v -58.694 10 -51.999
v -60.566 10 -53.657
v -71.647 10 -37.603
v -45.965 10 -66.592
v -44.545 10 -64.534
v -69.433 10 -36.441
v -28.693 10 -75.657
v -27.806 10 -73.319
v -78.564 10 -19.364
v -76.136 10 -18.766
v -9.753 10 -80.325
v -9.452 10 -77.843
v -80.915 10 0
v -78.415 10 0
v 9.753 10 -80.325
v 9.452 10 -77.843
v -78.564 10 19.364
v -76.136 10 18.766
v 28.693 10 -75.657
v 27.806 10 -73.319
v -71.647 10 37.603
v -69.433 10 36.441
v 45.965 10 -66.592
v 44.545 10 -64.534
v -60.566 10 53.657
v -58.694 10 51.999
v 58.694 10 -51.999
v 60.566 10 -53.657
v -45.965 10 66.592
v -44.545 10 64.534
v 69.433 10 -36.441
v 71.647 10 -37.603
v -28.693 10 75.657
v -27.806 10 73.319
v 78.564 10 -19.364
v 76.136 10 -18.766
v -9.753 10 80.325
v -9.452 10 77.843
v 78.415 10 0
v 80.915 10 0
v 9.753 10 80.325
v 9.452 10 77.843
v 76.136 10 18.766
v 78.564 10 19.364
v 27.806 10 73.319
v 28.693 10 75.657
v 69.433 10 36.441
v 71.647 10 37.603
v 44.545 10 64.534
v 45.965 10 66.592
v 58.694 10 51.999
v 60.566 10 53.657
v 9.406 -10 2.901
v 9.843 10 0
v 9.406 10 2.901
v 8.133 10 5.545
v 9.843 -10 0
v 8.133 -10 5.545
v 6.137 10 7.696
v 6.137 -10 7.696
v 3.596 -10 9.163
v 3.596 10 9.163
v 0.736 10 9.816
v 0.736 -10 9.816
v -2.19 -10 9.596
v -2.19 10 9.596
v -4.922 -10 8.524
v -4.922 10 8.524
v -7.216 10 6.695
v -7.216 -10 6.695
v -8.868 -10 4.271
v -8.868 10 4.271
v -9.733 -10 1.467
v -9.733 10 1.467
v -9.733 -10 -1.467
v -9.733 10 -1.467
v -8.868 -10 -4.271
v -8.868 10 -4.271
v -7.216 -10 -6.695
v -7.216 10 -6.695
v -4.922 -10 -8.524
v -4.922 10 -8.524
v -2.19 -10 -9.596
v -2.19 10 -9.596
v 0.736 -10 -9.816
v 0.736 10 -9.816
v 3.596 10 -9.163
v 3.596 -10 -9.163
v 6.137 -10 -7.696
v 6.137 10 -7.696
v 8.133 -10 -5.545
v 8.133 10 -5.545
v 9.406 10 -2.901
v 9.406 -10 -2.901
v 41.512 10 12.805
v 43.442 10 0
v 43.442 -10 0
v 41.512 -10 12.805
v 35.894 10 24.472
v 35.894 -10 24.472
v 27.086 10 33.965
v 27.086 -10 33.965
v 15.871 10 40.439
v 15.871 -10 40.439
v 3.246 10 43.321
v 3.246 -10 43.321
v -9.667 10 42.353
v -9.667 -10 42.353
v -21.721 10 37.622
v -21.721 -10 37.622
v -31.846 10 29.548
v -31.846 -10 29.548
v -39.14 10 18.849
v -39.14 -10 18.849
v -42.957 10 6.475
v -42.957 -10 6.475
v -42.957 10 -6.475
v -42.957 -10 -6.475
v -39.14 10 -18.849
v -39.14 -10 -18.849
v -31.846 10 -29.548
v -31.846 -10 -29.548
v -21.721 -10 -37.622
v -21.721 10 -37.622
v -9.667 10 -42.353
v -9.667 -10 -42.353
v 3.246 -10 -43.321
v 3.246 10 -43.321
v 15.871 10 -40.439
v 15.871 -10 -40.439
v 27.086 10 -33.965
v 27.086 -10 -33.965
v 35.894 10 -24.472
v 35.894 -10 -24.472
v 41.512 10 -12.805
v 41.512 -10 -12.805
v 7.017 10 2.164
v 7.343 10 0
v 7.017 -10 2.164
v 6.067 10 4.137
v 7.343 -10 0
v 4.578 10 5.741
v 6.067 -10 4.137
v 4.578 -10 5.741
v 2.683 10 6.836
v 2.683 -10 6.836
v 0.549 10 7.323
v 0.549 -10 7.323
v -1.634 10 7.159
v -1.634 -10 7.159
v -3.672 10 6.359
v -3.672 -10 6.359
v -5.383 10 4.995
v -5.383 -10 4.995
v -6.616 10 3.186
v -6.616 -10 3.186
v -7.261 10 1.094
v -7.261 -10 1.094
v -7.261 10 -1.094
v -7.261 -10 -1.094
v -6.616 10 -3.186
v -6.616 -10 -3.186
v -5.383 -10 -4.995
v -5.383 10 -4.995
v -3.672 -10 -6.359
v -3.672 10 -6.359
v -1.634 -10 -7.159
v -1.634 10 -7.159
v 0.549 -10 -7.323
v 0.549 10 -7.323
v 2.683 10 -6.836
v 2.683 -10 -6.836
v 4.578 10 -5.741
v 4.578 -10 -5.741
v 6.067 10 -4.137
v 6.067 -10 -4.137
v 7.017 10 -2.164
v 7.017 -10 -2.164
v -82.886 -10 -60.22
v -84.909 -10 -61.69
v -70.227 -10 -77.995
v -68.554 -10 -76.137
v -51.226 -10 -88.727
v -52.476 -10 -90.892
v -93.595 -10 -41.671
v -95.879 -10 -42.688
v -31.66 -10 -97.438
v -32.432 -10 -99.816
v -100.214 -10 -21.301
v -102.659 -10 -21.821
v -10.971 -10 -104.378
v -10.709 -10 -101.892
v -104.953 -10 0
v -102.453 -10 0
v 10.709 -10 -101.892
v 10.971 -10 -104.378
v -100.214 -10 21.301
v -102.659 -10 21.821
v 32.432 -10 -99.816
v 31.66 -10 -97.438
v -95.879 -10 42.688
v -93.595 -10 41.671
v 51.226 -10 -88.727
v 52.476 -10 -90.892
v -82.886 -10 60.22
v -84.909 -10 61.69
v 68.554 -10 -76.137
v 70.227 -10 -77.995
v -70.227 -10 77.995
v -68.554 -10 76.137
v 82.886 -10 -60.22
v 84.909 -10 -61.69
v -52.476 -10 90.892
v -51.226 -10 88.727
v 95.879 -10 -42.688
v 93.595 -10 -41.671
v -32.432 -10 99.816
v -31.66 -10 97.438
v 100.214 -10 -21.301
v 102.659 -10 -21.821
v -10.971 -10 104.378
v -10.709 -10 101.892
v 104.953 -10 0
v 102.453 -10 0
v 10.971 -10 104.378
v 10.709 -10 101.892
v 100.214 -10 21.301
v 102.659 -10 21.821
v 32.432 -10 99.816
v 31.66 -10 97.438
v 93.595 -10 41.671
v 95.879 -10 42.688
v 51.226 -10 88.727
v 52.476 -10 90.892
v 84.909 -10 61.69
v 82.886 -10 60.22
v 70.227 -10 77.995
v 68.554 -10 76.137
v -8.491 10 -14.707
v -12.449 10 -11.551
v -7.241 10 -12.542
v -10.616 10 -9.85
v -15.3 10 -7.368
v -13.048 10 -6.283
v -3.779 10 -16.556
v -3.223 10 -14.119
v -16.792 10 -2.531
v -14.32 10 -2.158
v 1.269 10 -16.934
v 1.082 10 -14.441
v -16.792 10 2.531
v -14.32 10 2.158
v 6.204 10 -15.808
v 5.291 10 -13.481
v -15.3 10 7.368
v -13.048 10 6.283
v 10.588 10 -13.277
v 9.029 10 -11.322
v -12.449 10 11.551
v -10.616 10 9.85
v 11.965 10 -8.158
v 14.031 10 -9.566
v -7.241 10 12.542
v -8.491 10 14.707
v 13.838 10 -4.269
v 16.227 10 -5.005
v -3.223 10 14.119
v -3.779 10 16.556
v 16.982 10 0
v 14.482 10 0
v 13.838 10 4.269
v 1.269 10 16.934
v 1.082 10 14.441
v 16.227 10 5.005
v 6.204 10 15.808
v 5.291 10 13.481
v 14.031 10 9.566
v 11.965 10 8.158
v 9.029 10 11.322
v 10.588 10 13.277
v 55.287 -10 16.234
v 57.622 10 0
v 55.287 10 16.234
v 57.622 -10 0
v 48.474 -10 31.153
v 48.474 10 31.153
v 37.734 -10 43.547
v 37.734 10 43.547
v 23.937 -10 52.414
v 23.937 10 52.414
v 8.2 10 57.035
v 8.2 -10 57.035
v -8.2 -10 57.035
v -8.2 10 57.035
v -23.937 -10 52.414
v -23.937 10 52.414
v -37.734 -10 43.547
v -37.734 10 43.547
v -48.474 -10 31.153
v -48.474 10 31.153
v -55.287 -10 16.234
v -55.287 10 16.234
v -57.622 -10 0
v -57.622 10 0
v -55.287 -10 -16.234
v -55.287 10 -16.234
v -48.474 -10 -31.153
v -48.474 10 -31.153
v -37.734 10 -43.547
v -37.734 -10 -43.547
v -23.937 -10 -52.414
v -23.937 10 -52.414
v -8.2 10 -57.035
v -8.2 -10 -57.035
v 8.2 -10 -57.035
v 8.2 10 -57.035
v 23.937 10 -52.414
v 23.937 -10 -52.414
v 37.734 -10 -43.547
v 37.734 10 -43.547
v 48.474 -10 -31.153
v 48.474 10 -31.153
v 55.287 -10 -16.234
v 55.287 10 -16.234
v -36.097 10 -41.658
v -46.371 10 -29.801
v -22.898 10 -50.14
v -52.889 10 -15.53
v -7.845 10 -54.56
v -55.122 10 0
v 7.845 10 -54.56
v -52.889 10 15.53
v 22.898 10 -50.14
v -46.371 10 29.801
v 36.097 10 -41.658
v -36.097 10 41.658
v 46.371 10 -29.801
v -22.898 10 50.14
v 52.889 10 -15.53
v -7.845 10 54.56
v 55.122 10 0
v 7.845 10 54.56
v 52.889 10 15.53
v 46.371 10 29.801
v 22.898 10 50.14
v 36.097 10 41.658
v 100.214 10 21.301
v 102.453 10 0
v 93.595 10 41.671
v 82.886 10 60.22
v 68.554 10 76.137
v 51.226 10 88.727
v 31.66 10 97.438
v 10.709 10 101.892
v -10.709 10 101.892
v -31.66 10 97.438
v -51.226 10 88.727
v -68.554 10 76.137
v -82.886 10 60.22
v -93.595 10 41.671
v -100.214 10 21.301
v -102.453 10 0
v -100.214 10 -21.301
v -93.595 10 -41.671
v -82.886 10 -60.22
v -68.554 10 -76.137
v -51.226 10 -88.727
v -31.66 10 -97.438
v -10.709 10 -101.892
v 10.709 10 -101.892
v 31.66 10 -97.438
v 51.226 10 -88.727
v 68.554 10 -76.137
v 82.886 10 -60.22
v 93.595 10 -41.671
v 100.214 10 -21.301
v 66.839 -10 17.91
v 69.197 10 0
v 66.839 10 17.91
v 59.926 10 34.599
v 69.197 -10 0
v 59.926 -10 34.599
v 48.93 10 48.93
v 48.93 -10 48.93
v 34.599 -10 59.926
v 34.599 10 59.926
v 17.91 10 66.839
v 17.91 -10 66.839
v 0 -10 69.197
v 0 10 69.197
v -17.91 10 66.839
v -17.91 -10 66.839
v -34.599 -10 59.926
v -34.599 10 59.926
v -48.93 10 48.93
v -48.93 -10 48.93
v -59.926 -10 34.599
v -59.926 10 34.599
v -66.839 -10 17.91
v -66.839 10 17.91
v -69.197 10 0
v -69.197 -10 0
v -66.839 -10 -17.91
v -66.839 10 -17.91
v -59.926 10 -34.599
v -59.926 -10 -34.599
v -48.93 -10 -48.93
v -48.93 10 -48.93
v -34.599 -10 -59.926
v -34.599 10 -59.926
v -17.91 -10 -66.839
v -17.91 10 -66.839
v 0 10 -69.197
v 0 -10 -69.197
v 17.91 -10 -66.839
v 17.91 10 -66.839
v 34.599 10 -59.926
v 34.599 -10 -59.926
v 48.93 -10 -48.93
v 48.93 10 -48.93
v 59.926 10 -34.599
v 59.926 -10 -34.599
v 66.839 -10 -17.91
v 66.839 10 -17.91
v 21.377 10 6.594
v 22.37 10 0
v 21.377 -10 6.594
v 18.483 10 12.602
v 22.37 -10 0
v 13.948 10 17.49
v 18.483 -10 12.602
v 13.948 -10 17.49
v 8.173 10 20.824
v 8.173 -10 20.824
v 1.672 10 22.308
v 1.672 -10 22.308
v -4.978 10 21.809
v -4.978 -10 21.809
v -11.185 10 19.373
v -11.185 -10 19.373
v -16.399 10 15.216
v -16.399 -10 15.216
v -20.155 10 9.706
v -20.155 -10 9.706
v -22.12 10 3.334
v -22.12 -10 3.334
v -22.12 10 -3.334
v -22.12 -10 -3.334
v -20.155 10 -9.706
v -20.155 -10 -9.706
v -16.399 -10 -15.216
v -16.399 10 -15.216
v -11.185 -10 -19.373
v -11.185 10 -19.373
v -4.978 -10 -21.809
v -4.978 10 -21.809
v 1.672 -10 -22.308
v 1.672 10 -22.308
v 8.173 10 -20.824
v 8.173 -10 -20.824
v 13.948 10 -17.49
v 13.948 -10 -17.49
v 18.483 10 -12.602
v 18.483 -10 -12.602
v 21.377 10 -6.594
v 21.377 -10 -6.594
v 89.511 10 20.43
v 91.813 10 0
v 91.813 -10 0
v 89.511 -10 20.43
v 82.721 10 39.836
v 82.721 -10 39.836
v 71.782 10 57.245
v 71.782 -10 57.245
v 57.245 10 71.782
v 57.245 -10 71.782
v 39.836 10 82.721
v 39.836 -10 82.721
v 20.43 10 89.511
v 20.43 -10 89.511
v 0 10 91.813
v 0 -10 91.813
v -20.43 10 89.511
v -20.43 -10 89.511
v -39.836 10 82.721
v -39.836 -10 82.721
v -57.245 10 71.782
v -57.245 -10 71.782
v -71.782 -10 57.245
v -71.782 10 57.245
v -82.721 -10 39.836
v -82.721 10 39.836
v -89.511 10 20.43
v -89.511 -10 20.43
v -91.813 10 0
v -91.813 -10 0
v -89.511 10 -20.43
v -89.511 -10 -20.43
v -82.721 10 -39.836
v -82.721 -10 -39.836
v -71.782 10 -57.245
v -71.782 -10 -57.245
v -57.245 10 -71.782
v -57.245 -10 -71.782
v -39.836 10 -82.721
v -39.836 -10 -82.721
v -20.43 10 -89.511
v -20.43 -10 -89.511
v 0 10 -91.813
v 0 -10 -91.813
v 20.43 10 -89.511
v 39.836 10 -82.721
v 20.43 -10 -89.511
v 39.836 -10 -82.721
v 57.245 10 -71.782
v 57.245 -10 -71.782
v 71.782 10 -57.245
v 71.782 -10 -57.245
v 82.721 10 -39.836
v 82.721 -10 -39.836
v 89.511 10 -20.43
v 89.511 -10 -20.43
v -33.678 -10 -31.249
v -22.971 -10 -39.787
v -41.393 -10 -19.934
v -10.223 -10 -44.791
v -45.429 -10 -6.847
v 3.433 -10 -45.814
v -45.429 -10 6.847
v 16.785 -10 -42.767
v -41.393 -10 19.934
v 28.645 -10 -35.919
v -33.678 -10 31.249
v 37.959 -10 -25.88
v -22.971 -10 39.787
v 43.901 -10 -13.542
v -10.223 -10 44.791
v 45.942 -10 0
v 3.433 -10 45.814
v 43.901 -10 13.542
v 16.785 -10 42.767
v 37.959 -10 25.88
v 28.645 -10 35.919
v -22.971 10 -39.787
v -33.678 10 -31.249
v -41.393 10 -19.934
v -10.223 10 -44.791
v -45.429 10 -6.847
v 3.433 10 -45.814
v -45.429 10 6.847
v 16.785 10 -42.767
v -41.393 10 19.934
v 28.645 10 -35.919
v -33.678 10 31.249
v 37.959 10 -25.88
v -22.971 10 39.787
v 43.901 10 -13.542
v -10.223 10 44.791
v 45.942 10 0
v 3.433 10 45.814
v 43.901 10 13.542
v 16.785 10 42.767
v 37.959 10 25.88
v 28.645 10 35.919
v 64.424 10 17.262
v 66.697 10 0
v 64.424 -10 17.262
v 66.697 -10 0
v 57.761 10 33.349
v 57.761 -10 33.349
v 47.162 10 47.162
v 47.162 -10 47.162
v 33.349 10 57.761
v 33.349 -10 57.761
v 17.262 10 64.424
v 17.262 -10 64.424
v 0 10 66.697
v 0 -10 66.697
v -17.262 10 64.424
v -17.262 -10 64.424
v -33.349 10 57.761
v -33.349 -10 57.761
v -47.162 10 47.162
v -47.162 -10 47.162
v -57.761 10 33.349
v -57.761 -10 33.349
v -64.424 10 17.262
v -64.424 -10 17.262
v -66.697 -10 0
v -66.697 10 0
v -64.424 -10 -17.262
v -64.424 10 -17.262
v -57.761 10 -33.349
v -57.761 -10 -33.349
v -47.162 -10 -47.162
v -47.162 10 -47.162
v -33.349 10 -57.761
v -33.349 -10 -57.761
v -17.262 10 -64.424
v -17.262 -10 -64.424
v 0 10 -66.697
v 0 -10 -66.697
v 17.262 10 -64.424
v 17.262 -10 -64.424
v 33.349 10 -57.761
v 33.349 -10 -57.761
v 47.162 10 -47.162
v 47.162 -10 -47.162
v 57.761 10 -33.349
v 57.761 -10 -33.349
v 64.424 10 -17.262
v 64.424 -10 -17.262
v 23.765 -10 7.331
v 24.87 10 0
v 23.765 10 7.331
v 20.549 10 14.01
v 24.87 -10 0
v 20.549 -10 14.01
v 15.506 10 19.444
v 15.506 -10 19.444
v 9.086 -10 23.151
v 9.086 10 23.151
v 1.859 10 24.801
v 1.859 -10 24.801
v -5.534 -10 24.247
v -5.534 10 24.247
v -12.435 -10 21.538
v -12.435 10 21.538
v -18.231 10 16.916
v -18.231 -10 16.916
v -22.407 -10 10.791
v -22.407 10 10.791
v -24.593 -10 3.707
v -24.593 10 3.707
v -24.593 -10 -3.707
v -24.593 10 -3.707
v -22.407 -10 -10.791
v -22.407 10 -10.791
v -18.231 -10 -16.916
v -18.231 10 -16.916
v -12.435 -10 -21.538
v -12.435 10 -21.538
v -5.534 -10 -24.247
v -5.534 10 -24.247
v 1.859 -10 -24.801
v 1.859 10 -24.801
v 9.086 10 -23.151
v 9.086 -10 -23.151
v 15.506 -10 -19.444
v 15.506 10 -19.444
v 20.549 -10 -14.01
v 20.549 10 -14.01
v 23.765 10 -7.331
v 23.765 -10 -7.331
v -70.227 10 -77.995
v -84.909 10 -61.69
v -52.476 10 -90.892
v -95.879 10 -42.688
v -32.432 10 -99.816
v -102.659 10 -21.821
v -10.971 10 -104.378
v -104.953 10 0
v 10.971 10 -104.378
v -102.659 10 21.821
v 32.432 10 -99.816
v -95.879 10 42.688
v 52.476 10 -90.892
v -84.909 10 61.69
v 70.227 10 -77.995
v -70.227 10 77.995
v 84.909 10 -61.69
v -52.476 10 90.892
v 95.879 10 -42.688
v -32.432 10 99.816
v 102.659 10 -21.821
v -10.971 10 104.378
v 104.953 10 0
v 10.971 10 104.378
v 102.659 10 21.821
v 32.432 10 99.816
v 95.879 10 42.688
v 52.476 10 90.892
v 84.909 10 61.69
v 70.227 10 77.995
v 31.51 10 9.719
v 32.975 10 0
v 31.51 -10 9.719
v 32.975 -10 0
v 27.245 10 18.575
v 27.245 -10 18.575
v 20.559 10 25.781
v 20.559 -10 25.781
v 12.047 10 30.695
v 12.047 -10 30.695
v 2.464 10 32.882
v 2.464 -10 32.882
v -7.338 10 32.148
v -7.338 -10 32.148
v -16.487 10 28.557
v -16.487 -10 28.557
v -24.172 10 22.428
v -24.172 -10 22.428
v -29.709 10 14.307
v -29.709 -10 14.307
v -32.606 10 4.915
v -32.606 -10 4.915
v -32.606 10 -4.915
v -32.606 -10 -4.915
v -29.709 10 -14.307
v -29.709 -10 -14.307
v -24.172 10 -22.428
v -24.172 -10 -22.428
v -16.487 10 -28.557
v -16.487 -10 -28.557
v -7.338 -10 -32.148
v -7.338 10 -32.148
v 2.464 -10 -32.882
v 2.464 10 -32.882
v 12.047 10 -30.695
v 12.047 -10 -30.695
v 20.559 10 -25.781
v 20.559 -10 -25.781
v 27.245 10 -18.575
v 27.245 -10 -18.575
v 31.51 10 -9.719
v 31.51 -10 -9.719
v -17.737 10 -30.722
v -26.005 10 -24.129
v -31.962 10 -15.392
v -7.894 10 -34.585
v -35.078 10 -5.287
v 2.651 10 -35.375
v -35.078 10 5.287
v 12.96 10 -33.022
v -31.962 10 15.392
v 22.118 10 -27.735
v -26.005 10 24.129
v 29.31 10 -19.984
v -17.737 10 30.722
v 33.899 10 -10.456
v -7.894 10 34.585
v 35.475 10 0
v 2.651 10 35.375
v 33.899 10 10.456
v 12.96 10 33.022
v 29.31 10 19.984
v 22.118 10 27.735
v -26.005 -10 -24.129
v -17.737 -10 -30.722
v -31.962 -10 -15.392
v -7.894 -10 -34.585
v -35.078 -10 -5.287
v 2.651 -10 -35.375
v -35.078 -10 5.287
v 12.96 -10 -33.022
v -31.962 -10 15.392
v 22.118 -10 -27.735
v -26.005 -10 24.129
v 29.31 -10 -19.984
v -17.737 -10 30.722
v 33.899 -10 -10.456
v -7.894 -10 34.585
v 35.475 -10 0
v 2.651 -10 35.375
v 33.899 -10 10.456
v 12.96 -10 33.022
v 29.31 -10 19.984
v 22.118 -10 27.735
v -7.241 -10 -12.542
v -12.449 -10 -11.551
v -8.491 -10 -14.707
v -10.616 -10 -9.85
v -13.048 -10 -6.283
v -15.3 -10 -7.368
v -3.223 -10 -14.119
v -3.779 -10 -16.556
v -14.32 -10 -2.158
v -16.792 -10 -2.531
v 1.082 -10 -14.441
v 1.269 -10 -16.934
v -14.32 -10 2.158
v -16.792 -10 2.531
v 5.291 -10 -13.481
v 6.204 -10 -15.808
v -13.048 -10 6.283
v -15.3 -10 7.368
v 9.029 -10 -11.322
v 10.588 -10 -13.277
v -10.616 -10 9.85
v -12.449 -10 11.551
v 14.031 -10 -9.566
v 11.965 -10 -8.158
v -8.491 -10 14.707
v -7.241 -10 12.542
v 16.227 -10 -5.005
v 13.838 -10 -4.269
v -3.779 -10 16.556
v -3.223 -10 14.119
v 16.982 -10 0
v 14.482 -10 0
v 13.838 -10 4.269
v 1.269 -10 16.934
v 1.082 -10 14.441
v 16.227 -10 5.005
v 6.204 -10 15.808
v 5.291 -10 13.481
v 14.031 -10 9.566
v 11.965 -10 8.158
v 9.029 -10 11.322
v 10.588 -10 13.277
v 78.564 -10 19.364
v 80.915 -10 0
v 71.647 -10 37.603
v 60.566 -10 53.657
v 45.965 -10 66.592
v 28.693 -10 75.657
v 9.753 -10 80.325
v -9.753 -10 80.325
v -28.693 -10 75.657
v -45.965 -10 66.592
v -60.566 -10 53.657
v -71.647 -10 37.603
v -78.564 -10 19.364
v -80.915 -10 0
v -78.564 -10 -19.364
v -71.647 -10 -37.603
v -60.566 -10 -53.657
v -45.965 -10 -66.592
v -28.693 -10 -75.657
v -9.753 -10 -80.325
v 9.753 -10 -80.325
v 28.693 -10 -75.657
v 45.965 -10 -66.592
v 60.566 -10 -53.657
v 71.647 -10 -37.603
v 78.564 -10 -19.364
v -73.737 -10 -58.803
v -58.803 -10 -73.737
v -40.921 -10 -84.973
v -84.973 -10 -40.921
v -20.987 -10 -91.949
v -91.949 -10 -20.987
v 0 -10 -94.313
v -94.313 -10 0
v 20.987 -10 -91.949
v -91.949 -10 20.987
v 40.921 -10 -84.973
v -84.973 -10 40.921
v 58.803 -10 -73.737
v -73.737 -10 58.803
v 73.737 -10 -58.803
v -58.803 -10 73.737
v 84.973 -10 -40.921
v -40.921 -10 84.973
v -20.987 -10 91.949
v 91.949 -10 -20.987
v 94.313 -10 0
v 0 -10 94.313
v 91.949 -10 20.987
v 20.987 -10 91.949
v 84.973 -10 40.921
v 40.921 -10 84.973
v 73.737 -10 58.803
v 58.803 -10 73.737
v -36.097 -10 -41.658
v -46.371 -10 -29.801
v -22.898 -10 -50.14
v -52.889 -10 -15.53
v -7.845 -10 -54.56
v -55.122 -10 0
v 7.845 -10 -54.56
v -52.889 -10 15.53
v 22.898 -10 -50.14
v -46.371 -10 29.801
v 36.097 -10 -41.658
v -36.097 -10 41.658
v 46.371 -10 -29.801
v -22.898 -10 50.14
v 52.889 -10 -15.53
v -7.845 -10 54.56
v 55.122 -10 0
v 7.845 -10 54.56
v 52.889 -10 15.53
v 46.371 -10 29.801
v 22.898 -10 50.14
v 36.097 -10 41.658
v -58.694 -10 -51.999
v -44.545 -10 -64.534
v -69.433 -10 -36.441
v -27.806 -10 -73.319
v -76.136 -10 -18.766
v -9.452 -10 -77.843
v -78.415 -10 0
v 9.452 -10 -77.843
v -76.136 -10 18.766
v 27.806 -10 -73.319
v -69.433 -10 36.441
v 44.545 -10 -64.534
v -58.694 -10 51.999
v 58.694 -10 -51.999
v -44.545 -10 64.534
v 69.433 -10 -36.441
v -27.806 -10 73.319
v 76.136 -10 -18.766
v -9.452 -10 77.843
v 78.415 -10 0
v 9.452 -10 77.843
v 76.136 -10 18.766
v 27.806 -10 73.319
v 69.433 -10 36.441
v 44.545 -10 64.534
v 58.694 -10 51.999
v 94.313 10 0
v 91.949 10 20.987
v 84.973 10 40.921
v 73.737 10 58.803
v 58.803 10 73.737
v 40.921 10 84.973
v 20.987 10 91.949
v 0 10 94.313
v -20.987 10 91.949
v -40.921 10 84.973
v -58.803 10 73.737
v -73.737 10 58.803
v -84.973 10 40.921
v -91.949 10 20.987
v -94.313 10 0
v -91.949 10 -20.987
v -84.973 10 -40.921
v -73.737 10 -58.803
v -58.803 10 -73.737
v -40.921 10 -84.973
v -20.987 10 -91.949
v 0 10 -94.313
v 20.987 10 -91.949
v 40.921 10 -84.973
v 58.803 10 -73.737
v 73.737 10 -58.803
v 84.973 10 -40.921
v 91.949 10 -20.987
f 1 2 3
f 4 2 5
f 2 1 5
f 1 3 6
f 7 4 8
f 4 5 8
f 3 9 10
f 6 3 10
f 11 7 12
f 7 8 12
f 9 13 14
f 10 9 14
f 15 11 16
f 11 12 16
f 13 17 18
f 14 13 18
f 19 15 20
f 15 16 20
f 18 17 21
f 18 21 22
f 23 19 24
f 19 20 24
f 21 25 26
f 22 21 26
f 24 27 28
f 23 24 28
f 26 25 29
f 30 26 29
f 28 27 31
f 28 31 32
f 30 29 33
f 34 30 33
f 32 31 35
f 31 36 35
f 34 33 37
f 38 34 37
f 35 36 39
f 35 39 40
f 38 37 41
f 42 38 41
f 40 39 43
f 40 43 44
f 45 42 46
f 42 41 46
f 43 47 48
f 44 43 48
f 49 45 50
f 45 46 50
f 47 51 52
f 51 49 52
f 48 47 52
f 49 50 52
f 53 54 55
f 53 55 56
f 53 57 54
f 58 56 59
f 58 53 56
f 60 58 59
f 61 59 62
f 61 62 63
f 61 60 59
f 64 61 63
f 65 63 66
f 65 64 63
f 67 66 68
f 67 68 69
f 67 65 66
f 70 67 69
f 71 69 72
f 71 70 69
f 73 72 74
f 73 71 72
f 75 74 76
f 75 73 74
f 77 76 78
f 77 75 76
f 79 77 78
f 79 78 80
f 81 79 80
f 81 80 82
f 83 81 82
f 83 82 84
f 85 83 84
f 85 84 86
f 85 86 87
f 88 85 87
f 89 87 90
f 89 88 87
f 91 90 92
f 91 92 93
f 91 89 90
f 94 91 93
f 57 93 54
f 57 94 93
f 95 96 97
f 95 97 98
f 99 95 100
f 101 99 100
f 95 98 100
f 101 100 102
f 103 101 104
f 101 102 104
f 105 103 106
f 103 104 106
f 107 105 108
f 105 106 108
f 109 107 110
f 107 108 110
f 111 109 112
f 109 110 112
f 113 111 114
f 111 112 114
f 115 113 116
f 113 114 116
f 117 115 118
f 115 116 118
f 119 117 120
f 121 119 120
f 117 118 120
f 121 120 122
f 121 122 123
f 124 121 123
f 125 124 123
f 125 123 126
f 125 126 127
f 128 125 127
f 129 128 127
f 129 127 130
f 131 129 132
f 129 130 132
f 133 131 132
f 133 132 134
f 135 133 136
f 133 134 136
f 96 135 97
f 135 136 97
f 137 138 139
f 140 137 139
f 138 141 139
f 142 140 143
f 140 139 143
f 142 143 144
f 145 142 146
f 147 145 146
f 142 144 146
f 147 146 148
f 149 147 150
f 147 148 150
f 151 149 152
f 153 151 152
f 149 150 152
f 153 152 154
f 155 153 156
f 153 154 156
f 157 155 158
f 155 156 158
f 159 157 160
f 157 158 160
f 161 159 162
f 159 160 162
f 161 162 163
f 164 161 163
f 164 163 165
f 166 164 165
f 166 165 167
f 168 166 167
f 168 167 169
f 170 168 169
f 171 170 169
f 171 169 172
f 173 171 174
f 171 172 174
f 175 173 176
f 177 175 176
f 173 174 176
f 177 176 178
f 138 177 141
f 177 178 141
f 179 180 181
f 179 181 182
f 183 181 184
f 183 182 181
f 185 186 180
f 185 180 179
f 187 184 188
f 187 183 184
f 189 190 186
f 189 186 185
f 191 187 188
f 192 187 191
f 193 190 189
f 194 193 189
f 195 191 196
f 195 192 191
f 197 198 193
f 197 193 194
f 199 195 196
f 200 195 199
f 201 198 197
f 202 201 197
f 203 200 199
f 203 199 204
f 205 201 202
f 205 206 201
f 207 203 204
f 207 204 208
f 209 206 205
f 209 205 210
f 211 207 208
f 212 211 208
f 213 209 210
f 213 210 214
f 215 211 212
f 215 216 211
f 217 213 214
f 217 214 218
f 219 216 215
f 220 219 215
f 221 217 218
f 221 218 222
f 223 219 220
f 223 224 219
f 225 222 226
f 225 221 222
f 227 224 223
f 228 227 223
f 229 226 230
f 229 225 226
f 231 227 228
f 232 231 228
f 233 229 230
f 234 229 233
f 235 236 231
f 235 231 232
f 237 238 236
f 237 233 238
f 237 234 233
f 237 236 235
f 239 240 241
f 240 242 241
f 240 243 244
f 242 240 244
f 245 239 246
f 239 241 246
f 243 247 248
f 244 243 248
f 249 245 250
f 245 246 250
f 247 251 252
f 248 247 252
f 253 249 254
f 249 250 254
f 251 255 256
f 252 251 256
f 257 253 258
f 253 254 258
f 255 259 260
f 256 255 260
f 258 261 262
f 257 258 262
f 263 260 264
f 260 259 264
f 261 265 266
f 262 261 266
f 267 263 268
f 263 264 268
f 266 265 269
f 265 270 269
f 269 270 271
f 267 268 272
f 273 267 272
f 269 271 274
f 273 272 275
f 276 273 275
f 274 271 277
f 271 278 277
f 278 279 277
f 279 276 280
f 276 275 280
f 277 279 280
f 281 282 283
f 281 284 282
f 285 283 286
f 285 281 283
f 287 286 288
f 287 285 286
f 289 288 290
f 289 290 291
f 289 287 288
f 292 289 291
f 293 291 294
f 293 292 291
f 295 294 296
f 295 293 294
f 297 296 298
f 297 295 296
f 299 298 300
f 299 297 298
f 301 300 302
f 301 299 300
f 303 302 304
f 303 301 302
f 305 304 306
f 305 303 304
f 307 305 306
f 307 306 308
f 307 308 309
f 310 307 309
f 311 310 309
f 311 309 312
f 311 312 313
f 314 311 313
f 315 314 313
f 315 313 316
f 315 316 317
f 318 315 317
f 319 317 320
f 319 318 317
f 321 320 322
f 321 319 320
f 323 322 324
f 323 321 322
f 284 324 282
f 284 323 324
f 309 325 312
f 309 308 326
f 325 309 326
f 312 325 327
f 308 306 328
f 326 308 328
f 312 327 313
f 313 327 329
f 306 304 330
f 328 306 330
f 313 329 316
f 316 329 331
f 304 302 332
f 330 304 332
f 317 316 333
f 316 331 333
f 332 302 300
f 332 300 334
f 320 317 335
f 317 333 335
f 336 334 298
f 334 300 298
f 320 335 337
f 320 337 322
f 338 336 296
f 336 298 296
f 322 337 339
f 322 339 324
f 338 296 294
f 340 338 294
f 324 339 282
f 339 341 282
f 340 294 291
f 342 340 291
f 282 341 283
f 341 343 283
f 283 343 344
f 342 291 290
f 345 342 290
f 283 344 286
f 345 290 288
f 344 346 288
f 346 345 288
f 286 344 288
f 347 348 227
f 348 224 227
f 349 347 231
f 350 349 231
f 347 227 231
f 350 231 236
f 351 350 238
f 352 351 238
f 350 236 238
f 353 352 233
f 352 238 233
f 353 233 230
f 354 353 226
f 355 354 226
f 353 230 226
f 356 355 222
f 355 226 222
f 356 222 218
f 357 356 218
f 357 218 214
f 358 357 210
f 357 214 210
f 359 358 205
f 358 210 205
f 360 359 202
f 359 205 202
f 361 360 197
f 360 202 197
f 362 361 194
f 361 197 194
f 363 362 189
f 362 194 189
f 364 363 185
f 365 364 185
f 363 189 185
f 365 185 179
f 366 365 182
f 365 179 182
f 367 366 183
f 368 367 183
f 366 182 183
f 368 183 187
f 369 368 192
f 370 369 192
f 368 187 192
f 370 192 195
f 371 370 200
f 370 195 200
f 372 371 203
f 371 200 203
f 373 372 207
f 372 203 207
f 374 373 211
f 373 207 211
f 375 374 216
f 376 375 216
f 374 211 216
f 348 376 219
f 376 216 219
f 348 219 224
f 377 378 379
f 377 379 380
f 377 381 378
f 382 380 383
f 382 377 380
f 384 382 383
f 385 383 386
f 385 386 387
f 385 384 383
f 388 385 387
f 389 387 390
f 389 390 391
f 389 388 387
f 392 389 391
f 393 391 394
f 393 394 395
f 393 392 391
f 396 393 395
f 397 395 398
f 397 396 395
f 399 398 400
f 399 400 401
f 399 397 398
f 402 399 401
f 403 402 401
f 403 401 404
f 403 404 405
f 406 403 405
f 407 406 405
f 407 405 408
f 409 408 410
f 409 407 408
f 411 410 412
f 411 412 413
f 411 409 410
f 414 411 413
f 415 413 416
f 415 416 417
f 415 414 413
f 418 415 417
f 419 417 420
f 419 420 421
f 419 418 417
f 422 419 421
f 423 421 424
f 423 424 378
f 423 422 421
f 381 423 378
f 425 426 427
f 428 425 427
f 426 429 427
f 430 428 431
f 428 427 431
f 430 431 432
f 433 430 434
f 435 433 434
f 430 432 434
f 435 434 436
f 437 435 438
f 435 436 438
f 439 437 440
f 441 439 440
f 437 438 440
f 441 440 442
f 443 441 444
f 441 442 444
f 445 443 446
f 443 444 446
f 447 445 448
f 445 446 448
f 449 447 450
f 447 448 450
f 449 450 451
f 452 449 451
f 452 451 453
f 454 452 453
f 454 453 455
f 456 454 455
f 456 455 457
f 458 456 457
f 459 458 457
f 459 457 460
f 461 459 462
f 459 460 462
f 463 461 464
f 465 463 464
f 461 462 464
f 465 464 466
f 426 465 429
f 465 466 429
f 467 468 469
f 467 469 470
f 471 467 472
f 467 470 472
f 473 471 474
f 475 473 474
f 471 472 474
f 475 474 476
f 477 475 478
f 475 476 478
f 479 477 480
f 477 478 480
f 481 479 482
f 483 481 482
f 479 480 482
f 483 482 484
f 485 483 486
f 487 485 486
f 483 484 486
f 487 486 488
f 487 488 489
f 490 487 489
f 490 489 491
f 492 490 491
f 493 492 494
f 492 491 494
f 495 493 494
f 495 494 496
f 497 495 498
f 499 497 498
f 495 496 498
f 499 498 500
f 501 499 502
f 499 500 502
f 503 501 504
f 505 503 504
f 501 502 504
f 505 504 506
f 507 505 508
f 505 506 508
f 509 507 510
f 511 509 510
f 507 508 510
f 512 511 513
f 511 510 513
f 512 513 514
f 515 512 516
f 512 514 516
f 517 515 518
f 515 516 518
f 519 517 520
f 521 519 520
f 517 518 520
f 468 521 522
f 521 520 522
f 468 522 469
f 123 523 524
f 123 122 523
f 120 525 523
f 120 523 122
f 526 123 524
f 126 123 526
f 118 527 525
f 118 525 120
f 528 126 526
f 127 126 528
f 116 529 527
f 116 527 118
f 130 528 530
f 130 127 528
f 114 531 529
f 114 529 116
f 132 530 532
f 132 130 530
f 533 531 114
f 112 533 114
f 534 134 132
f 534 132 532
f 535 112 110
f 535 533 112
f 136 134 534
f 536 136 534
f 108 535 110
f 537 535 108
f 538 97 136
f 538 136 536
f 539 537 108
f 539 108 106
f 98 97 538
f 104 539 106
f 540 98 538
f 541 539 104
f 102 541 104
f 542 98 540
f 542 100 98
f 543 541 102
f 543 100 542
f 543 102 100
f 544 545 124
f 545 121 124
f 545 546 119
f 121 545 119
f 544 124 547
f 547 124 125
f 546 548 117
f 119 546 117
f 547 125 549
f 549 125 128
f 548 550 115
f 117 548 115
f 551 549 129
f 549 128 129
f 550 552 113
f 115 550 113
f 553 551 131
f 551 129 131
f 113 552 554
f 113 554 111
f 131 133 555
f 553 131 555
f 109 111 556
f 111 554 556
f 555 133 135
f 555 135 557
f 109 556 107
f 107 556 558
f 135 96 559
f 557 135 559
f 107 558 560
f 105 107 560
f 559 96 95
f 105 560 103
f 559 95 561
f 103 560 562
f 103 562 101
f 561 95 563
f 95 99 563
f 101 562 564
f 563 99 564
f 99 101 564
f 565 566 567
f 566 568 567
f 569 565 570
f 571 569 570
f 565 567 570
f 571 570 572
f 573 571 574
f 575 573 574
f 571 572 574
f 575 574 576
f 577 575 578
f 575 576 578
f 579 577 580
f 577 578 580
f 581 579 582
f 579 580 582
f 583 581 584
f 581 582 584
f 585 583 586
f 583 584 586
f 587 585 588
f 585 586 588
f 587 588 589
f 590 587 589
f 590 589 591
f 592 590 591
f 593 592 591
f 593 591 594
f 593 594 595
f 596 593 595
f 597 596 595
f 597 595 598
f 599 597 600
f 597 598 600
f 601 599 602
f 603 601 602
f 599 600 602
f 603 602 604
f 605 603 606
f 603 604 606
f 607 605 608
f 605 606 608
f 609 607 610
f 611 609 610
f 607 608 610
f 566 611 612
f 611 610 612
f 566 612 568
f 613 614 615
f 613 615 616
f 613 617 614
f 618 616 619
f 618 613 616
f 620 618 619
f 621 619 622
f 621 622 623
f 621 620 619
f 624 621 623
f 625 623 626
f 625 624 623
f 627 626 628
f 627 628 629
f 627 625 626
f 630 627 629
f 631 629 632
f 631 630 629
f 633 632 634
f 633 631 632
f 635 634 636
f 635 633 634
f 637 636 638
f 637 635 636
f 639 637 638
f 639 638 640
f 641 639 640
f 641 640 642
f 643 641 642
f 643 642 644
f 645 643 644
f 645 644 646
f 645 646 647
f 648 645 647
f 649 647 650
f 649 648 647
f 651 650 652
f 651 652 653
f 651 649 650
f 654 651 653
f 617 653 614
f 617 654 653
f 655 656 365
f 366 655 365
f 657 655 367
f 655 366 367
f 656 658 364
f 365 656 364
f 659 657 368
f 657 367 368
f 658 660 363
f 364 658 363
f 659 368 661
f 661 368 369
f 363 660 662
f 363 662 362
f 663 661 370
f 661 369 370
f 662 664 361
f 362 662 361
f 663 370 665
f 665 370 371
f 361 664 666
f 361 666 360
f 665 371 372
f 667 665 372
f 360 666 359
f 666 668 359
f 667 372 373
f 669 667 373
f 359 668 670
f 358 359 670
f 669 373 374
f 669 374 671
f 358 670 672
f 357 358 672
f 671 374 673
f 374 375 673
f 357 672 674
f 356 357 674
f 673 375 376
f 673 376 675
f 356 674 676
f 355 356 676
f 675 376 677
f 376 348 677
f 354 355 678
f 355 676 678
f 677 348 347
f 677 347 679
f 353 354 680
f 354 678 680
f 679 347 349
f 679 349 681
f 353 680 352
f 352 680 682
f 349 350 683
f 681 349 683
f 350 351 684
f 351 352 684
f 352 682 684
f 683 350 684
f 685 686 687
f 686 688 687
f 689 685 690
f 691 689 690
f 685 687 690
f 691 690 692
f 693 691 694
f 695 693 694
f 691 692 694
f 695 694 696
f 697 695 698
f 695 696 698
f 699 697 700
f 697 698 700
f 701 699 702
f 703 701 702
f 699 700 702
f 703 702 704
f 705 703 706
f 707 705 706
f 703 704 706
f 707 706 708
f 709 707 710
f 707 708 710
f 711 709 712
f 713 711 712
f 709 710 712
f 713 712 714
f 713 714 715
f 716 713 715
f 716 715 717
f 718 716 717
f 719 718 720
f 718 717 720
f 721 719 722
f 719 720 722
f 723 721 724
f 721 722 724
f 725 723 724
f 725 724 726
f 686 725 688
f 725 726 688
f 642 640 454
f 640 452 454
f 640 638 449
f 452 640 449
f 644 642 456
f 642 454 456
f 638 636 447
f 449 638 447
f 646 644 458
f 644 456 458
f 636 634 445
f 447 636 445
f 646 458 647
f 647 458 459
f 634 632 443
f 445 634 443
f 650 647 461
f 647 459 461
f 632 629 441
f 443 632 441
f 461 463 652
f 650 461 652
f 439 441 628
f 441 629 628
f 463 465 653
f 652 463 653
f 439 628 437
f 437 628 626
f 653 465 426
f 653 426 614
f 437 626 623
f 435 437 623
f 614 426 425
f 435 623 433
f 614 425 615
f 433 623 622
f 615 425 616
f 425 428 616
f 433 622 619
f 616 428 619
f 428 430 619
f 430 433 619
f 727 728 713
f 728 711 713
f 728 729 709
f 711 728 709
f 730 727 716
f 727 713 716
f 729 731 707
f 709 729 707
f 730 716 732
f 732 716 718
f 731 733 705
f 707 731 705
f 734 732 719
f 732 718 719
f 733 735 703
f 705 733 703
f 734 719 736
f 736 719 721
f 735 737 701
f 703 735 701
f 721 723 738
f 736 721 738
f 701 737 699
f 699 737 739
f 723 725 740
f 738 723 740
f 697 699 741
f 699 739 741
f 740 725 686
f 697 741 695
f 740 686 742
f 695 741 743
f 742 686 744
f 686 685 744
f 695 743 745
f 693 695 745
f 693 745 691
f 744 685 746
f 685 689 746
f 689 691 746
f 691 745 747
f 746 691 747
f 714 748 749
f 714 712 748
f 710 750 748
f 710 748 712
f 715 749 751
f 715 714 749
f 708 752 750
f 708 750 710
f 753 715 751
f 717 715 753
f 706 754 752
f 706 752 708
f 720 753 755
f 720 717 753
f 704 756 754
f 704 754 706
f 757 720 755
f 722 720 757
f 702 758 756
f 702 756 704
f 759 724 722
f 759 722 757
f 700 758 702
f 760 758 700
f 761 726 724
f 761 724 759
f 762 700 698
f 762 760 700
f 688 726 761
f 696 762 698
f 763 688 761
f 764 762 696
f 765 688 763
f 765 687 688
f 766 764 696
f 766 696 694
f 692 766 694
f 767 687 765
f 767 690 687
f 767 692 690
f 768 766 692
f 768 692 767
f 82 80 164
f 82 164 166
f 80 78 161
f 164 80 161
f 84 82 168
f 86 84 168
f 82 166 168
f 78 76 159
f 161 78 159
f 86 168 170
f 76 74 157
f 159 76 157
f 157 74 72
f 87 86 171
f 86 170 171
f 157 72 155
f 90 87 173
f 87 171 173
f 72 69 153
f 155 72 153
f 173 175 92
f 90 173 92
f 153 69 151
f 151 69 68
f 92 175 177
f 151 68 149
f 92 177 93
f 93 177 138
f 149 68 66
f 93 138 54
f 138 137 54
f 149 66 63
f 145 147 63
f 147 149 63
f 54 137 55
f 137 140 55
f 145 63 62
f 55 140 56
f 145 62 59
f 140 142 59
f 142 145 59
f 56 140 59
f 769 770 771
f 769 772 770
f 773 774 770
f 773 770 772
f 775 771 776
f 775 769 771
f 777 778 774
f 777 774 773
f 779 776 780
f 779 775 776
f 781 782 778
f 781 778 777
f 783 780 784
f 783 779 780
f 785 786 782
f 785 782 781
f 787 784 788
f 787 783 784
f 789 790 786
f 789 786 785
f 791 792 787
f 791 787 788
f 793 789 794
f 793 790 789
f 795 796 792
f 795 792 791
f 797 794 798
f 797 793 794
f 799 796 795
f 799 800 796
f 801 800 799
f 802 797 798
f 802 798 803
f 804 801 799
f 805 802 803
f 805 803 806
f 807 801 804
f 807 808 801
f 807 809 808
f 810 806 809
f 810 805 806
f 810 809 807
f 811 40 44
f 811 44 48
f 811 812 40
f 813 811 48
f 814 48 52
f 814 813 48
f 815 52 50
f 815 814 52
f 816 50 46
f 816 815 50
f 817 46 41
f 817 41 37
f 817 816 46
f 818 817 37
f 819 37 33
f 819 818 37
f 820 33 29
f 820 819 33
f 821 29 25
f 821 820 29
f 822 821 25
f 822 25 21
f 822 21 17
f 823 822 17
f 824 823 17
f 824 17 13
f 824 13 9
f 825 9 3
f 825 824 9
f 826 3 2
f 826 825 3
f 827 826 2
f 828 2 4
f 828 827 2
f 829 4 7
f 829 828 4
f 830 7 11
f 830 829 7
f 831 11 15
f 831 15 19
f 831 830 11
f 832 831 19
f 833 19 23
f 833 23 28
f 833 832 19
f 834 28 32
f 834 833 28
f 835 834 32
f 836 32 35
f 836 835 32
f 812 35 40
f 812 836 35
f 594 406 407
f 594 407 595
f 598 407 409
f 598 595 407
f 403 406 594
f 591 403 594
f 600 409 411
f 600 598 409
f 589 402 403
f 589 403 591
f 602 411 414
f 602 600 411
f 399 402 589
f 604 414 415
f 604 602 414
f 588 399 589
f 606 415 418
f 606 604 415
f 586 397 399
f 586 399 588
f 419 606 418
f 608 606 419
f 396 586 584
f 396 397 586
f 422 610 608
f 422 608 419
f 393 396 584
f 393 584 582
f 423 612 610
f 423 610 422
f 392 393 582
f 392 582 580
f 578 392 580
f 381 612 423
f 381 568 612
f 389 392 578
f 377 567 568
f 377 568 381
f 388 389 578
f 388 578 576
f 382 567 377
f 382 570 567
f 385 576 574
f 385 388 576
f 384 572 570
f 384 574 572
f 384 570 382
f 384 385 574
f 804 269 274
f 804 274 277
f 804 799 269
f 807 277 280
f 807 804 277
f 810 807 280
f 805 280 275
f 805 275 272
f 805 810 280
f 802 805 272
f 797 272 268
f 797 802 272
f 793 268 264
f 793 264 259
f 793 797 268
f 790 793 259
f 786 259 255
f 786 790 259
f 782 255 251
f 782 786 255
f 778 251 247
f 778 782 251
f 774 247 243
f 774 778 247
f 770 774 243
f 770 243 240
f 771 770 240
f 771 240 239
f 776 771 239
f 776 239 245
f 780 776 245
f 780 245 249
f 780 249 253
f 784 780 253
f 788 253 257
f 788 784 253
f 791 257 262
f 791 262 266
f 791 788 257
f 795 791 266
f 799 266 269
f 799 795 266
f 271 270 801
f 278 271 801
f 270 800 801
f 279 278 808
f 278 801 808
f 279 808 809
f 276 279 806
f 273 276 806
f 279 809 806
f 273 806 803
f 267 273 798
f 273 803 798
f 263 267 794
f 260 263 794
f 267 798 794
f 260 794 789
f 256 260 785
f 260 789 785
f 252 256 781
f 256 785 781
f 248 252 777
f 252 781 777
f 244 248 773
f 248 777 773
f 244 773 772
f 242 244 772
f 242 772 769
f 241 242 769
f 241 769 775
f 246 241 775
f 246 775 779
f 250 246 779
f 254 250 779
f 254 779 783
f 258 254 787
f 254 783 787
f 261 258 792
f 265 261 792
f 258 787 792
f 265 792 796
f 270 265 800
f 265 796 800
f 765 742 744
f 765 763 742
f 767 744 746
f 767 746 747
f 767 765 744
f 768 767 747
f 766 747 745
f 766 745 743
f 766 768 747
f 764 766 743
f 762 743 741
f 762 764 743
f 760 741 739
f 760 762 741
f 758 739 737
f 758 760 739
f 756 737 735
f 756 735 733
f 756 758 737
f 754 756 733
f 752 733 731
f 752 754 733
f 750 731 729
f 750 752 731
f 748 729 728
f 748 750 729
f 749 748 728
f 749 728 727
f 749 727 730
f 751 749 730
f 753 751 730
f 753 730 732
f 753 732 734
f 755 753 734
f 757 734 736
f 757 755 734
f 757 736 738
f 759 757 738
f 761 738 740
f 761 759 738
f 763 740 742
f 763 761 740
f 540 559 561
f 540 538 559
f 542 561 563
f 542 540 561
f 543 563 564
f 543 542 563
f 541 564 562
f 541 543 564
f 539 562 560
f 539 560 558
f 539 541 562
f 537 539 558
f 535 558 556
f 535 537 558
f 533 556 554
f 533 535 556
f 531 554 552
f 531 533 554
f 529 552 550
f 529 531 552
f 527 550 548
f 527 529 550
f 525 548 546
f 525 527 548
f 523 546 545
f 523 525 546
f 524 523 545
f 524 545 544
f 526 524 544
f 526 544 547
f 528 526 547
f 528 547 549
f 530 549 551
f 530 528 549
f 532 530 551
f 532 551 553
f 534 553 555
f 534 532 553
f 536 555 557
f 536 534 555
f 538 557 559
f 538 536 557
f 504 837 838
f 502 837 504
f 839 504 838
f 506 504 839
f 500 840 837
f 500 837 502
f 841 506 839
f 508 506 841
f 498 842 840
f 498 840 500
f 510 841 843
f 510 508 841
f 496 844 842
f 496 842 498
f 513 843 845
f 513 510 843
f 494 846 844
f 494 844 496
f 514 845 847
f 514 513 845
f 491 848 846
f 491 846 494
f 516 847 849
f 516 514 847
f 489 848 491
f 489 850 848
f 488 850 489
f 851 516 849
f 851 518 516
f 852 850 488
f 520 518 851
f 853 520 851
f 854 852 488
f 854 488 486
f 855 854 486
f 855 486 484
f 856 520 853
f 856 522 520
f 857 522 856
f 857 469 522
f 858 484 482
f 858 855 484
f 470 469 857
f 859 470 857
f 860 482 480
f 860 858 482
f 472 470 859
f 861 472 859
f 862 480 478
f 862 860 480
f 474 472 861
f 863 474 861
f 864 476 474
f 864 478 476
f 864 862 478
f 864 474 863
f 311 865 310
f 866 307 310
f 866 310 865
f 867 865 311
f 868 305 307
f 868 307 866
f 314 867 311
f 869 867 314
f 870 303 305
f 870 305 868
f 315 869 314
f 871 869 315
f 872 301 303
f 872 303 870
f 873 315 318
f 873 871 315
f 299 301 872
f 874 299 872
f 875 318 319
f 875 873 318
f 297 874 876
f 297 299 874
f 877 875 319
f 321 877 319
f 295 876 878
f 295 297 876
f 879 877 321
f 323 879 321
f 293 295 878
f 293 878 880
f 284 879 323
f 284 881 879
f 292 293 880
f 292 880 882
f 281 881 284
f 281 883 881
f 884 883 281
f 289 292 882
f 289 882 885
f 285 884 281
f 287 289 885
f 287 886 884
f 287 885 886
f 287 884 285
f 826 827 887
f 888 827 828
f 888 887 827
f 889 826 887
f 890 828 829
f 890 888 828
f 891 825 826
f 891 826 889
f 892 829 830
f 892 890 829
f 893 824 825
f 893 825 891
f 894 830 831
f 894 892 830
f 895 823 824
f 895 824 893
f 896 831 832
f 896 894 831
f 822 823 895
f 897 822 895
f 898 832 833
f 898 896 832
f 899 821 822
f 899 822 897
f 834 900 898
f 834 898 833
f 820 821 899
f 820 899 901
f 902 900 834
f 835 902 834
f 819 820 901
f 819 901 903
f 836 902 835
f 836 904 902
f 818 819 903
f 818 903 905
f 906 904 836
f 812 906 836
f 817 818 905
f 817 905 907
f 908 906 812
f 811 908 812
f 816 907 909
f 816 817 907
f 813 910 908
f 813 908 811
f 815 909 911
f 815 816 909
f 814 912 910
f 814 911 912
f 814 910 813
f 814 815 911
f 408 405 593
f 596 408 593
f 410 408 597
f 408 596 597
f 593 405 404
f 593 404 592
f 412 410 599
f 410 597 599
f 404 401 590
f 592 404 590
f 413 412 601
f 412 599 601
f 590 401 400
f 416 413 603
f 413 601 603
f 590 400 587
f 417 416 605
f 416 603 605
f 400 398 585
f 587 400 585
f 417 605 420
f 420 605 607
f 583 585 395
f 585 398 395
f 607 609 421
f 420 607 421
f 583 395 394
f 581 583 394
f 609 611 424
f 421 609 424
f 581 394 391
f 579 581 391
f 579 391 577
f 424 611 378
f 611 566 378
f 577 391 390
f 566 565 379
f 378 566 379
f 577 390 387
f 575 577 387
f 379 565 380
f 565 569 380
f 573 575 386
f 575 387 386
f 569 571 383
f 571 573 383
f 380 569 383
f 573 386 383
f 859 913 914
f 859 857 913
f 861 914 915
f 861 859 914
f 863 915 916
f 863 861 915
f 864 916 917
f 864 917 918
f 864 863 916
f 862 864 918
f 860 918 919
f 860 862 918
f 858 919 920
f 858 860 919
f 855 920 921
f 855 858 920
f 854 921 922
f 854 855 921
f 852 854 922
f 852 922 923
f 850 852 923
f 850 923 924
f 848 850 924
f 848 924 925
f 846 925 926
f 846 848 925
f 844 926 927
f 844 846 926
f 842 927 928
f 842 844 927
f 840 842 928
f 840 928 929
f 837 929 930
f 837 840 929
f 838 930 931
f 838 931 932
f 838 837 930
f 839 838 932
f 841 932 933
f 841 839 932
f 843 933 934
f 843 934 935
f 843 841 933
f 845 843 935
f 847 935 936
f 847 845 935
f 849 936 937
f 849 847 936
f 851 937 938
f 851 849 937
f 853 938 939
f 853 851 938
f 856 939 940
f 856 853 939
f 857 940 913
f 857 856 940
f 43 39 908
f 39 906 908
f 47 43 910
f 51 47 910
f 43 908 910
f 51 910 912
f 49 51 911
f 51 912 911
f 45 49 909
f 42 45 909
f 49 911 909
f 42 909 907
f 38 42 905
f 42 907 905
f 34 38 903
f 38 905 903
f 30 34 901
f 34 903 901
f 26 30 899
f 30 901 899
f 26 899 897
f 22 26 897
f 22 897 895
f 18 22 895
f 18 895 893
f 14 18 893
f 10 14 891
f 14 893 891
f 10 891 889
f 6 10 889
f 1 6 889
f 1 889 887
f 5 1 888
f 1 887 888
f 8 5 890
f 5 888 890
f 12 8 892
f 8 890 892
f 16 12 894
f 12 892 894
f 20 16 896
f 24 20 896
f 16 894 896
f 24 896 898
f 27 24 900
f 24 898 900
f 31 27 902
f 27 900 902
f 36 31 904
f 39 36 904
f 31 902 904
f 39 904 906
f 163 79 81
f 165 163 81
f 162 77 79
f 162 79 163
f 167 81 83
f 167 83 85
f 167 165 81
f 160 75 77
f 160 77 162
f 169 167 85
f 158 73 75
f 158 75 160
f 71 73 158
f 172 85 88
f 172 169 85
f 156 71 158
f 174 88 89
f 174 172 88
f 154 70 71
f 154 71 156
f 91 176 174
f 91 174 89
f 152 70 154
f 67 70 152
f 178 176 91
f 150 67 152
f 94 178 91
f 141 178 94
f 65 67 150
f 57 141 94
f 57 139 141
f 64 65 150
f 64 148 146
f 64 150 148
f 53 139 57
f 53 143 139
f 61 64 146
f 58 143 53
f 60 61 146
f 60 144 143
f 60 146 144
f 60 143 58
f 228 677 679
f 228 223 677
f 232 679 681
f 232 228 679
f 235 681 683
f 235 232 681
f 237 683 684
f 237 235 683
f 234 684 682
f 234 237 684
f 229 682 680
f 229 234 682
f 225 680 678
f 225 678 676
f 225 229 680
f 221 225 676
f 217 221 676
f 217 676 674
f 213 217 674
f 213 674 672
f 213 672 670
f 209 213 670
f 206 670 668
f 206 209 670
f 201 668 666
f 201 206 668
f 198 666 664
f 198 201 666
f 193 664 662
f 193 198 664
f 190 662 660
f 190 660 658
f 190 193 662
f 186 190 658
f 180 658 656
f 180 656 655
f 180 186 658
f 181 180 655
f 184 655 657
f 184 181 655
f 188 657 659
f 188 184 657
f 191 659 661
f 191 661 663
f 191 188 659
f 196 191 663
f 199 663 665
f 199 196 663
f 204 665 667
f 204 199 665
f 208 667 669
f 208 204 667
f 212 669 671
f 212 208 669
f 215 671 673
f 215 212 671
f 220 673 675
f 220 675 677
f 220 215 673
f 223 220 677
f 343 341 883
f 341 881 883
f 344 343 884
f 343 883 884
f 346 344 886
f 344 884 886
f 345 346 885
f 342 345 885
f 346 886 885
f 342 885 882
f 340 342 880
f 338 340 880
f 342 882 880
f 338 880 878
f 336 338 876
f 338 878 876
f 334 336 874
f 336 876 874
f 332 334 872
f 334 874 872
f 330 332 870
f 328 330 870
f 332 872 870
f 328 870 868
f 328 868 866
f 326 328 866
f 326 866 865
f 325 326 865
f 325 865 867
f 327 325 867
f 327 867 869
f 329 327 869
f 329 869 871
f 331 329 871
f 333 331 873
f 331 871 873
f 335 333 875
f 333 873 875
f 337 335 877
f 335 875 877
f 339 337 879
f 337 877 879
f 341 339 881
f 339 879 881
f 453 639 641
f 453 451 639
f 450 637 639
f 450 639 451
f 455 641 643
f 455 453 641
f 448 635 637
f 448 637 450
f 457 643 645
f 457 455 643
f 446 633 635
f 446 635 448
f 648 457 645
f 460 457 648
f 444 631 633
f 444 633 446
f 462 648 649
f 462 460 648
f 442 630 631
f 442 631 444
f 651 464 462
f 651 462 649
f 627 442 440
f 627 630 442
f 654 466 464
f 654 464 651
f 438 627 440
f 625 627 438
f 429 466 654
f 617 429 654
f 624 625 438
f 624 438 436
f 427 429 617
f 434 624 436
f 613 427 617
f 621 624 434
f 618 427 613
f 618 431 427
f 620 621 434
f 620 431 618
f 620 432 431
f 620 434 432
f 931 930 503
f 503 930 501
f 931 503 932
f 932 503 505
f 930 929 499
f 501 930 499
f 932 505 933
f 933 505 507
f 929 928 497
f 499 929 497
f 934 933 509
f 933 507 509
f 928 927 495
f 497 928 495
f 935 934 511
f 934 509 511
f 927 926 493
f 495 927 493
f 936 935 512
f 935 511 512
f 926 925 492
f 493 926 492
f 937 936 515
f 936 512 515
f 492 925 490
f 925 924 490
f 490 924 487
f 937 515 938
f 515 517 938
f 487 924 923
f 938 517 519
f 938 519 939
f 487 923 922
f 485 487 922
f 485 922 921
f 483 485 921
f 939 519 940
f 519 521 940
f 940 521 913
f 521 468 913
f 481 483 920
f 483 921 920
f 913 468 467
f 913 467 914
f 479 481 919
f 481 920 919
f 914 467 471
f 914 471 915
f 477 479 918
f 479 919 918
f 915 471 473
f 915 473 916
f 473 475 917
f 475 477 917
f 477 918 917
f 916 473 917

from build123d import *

# Parameters (mm, degrees)
F0_R      = 104.952846
F1_DEPTH  = 10
F2_T      = -2.5
F3_R      = 94.313262
F4_DEPTH  = 10
F5_T      = -2.5
F6_R      = 80.914942
F7_DEPTH  = 10
F8_T      = -2.5
F9_R      = 69.197117
F10_DEPTH = 10
F11_T     = -2.5
F12_R     = 57.621545
F13_DEPTH = 10
F14_T     = -2.5
F15_R     = 45.942481
F16_DEPTH = 10
F17_T     = -2.5
F18_R     = 35.474602
F19_DEPTH = 10
F20_T     = -2.5
F21_R     = 24.870357
F22_DEPTH = 10
F23_T     = -2.5
F24_R     = 16.981804
F25_DEPTH = 10
F26_T     = -2.5
F27_R     = 9.843111
F28_DEPTH = 10
F29_T     = -2.5


with BuildPart() as f1:
    # F0 (on Front) → F1 (new body, symmetric)
    with BuildSketch(Plane.XZ):
        Circle(F0_R)
    extrude(amount=F1_DEPTH, both=True)

    # F2
    f2_openings = [f1.faces().sort_by_distance(p)[0] for p in [
        (0, -10, 0),
        (0, 10, 0),
    ]]
    offset(amount=F2_T, openings=f2_openings)


with BuildPart() as f4:
    # F3 (on Front) → F4 (new body, symmetric)
    with BuildSketch(Plane.XZ):
        Circle(F3_R)
    extrude(amount=F4_DEPTH, both=True)

    # F5
    f5_openings = [f4.faces().sort_by_distance(p)[0] for p in [
        (0, -10, 0),
        (0, 10, 0),
    ]]
    offset(amount=F5_T, openings=f5_openings)


with BuildPart() as f7:
    # F6 (on Front) → F7 (new body, symmetric)
    with BuildSketch(Plane.XZ):
        Circle(F6_R)
    extrude(amount=F7_DEPTH, both=True)

    # F8
    f8_openings = [f7.faces().sort_by_distance(p)[0] for p in [
        (0, -10, 0),
        (0, 10, 0),
    ]]
    offset(amount=F8_T, openings=f8_openings)


with BuildPart() as f10:
    # F9 (on Front) → F10 (new body, symmetric)
    with BuildSketch(Plane.XZ):
        Circle(F9_R)
    extrude(amount=F10_DEPTH, both=True)

    # F11
    f11_openings = [f10.faces().sort_by_distance(p)[0] for p in [
        (0, -10, 0),
        (0, 10, 0),
    ]]
    offset(amount=F11_T, openings=f11_openings)


with BuildPart() as f13:
    # F12 (on Front) → F13 (new body, symmetric)
    with BuildSketch(Plane.XZ):
        Circle(F12_R)
    extrude(amount=F13_DEPTH, both=True)

    # F14
    f14_openings = [f13.faces().sort_by_distance(p)[0] for p in [
        (0, -10, 0),
        (0, 10, 0),
    ]]
    offset(amount=F14_T, openings=f14_openings)


with BuildPart() as f16:
    # F15 (on Front) → F16 (new body, symmetric)
    with BuildSketch(Plane.XZ):
        Circle(F15_R)
    extrude(amount=F16_DEPTH, both=True)

    # F17
    f17_openings = [f16.faces().sort_by_distance(p)[0] for p in [
        (0, -10, 0),
        (0, 10, 0),
    ]]
    offset(amount=F17_T, openings=f17_openings)


with BuildPart() as f19:
    # F18 (on Front) → F19 (new body, symmetric)
    with BuildSketch(Plane.XZ):
        Circle(F18_R)
    extrude(amount=F19_DEPTH, both=True)

    # F20
    f20_openings = [f19.faces().sort_by_distance(p)[0] for p in [
        (0, -10, 0),
        (0, 10, 0),
    ]]
    offset(amount=F20_T, openings=f20_openings)


with BuildPart() as f22:
    # F21 (on Front) → F22 (new body, symmetric)
    with BuildSketch(Plane.XZ):
        Circle(F21_R)
    extrude(amount=F22_DEPTH, both=True)

    # F23
    f23_openings = [f22.faces().sort_by_distance(p)[0] for p in [
        (0, -10, 0),
        (0, 10, 0),
    ]]
    offset(amount=F23_T, openings=f23_openings)


with BuildPart() as f25:
    # F24 (on Front) → F25 (new body, symmetric)
    with BuildSketch(Plane.XZ):
        Circle(F24_R)
    extrude(amount=F25_DEPTH, both=True)

    # F26
    f26_openings = [f25.faces().sort_by_distance(p)[0] for p in [
        (0, -10, 0),
        (0, 10, 0),
    ]]
    offset(amount=F26_T, openings=f26_openings)


with BuildPart() as f28:
    # F27 (on Front) → F28 (new body, symmetric)
    with BuildSketch(Plane.XZ):
        Circle(F27_R)
    extrude(amount=F28_DEPTH, both=True)

    # F29
    f29_openings = [f28.faces().sort_by_distance(p)[0] for p in [
        (0, -10, 0),
        (0, 10, 0),
    ]]
    offset(amount=F29_T, openings=f29_openings)


solid = Compound([f1.part, f4.part, f7.part, f10.part, f13.part, f16.part, f19.part, f22.part, f25.part, f28.part])
